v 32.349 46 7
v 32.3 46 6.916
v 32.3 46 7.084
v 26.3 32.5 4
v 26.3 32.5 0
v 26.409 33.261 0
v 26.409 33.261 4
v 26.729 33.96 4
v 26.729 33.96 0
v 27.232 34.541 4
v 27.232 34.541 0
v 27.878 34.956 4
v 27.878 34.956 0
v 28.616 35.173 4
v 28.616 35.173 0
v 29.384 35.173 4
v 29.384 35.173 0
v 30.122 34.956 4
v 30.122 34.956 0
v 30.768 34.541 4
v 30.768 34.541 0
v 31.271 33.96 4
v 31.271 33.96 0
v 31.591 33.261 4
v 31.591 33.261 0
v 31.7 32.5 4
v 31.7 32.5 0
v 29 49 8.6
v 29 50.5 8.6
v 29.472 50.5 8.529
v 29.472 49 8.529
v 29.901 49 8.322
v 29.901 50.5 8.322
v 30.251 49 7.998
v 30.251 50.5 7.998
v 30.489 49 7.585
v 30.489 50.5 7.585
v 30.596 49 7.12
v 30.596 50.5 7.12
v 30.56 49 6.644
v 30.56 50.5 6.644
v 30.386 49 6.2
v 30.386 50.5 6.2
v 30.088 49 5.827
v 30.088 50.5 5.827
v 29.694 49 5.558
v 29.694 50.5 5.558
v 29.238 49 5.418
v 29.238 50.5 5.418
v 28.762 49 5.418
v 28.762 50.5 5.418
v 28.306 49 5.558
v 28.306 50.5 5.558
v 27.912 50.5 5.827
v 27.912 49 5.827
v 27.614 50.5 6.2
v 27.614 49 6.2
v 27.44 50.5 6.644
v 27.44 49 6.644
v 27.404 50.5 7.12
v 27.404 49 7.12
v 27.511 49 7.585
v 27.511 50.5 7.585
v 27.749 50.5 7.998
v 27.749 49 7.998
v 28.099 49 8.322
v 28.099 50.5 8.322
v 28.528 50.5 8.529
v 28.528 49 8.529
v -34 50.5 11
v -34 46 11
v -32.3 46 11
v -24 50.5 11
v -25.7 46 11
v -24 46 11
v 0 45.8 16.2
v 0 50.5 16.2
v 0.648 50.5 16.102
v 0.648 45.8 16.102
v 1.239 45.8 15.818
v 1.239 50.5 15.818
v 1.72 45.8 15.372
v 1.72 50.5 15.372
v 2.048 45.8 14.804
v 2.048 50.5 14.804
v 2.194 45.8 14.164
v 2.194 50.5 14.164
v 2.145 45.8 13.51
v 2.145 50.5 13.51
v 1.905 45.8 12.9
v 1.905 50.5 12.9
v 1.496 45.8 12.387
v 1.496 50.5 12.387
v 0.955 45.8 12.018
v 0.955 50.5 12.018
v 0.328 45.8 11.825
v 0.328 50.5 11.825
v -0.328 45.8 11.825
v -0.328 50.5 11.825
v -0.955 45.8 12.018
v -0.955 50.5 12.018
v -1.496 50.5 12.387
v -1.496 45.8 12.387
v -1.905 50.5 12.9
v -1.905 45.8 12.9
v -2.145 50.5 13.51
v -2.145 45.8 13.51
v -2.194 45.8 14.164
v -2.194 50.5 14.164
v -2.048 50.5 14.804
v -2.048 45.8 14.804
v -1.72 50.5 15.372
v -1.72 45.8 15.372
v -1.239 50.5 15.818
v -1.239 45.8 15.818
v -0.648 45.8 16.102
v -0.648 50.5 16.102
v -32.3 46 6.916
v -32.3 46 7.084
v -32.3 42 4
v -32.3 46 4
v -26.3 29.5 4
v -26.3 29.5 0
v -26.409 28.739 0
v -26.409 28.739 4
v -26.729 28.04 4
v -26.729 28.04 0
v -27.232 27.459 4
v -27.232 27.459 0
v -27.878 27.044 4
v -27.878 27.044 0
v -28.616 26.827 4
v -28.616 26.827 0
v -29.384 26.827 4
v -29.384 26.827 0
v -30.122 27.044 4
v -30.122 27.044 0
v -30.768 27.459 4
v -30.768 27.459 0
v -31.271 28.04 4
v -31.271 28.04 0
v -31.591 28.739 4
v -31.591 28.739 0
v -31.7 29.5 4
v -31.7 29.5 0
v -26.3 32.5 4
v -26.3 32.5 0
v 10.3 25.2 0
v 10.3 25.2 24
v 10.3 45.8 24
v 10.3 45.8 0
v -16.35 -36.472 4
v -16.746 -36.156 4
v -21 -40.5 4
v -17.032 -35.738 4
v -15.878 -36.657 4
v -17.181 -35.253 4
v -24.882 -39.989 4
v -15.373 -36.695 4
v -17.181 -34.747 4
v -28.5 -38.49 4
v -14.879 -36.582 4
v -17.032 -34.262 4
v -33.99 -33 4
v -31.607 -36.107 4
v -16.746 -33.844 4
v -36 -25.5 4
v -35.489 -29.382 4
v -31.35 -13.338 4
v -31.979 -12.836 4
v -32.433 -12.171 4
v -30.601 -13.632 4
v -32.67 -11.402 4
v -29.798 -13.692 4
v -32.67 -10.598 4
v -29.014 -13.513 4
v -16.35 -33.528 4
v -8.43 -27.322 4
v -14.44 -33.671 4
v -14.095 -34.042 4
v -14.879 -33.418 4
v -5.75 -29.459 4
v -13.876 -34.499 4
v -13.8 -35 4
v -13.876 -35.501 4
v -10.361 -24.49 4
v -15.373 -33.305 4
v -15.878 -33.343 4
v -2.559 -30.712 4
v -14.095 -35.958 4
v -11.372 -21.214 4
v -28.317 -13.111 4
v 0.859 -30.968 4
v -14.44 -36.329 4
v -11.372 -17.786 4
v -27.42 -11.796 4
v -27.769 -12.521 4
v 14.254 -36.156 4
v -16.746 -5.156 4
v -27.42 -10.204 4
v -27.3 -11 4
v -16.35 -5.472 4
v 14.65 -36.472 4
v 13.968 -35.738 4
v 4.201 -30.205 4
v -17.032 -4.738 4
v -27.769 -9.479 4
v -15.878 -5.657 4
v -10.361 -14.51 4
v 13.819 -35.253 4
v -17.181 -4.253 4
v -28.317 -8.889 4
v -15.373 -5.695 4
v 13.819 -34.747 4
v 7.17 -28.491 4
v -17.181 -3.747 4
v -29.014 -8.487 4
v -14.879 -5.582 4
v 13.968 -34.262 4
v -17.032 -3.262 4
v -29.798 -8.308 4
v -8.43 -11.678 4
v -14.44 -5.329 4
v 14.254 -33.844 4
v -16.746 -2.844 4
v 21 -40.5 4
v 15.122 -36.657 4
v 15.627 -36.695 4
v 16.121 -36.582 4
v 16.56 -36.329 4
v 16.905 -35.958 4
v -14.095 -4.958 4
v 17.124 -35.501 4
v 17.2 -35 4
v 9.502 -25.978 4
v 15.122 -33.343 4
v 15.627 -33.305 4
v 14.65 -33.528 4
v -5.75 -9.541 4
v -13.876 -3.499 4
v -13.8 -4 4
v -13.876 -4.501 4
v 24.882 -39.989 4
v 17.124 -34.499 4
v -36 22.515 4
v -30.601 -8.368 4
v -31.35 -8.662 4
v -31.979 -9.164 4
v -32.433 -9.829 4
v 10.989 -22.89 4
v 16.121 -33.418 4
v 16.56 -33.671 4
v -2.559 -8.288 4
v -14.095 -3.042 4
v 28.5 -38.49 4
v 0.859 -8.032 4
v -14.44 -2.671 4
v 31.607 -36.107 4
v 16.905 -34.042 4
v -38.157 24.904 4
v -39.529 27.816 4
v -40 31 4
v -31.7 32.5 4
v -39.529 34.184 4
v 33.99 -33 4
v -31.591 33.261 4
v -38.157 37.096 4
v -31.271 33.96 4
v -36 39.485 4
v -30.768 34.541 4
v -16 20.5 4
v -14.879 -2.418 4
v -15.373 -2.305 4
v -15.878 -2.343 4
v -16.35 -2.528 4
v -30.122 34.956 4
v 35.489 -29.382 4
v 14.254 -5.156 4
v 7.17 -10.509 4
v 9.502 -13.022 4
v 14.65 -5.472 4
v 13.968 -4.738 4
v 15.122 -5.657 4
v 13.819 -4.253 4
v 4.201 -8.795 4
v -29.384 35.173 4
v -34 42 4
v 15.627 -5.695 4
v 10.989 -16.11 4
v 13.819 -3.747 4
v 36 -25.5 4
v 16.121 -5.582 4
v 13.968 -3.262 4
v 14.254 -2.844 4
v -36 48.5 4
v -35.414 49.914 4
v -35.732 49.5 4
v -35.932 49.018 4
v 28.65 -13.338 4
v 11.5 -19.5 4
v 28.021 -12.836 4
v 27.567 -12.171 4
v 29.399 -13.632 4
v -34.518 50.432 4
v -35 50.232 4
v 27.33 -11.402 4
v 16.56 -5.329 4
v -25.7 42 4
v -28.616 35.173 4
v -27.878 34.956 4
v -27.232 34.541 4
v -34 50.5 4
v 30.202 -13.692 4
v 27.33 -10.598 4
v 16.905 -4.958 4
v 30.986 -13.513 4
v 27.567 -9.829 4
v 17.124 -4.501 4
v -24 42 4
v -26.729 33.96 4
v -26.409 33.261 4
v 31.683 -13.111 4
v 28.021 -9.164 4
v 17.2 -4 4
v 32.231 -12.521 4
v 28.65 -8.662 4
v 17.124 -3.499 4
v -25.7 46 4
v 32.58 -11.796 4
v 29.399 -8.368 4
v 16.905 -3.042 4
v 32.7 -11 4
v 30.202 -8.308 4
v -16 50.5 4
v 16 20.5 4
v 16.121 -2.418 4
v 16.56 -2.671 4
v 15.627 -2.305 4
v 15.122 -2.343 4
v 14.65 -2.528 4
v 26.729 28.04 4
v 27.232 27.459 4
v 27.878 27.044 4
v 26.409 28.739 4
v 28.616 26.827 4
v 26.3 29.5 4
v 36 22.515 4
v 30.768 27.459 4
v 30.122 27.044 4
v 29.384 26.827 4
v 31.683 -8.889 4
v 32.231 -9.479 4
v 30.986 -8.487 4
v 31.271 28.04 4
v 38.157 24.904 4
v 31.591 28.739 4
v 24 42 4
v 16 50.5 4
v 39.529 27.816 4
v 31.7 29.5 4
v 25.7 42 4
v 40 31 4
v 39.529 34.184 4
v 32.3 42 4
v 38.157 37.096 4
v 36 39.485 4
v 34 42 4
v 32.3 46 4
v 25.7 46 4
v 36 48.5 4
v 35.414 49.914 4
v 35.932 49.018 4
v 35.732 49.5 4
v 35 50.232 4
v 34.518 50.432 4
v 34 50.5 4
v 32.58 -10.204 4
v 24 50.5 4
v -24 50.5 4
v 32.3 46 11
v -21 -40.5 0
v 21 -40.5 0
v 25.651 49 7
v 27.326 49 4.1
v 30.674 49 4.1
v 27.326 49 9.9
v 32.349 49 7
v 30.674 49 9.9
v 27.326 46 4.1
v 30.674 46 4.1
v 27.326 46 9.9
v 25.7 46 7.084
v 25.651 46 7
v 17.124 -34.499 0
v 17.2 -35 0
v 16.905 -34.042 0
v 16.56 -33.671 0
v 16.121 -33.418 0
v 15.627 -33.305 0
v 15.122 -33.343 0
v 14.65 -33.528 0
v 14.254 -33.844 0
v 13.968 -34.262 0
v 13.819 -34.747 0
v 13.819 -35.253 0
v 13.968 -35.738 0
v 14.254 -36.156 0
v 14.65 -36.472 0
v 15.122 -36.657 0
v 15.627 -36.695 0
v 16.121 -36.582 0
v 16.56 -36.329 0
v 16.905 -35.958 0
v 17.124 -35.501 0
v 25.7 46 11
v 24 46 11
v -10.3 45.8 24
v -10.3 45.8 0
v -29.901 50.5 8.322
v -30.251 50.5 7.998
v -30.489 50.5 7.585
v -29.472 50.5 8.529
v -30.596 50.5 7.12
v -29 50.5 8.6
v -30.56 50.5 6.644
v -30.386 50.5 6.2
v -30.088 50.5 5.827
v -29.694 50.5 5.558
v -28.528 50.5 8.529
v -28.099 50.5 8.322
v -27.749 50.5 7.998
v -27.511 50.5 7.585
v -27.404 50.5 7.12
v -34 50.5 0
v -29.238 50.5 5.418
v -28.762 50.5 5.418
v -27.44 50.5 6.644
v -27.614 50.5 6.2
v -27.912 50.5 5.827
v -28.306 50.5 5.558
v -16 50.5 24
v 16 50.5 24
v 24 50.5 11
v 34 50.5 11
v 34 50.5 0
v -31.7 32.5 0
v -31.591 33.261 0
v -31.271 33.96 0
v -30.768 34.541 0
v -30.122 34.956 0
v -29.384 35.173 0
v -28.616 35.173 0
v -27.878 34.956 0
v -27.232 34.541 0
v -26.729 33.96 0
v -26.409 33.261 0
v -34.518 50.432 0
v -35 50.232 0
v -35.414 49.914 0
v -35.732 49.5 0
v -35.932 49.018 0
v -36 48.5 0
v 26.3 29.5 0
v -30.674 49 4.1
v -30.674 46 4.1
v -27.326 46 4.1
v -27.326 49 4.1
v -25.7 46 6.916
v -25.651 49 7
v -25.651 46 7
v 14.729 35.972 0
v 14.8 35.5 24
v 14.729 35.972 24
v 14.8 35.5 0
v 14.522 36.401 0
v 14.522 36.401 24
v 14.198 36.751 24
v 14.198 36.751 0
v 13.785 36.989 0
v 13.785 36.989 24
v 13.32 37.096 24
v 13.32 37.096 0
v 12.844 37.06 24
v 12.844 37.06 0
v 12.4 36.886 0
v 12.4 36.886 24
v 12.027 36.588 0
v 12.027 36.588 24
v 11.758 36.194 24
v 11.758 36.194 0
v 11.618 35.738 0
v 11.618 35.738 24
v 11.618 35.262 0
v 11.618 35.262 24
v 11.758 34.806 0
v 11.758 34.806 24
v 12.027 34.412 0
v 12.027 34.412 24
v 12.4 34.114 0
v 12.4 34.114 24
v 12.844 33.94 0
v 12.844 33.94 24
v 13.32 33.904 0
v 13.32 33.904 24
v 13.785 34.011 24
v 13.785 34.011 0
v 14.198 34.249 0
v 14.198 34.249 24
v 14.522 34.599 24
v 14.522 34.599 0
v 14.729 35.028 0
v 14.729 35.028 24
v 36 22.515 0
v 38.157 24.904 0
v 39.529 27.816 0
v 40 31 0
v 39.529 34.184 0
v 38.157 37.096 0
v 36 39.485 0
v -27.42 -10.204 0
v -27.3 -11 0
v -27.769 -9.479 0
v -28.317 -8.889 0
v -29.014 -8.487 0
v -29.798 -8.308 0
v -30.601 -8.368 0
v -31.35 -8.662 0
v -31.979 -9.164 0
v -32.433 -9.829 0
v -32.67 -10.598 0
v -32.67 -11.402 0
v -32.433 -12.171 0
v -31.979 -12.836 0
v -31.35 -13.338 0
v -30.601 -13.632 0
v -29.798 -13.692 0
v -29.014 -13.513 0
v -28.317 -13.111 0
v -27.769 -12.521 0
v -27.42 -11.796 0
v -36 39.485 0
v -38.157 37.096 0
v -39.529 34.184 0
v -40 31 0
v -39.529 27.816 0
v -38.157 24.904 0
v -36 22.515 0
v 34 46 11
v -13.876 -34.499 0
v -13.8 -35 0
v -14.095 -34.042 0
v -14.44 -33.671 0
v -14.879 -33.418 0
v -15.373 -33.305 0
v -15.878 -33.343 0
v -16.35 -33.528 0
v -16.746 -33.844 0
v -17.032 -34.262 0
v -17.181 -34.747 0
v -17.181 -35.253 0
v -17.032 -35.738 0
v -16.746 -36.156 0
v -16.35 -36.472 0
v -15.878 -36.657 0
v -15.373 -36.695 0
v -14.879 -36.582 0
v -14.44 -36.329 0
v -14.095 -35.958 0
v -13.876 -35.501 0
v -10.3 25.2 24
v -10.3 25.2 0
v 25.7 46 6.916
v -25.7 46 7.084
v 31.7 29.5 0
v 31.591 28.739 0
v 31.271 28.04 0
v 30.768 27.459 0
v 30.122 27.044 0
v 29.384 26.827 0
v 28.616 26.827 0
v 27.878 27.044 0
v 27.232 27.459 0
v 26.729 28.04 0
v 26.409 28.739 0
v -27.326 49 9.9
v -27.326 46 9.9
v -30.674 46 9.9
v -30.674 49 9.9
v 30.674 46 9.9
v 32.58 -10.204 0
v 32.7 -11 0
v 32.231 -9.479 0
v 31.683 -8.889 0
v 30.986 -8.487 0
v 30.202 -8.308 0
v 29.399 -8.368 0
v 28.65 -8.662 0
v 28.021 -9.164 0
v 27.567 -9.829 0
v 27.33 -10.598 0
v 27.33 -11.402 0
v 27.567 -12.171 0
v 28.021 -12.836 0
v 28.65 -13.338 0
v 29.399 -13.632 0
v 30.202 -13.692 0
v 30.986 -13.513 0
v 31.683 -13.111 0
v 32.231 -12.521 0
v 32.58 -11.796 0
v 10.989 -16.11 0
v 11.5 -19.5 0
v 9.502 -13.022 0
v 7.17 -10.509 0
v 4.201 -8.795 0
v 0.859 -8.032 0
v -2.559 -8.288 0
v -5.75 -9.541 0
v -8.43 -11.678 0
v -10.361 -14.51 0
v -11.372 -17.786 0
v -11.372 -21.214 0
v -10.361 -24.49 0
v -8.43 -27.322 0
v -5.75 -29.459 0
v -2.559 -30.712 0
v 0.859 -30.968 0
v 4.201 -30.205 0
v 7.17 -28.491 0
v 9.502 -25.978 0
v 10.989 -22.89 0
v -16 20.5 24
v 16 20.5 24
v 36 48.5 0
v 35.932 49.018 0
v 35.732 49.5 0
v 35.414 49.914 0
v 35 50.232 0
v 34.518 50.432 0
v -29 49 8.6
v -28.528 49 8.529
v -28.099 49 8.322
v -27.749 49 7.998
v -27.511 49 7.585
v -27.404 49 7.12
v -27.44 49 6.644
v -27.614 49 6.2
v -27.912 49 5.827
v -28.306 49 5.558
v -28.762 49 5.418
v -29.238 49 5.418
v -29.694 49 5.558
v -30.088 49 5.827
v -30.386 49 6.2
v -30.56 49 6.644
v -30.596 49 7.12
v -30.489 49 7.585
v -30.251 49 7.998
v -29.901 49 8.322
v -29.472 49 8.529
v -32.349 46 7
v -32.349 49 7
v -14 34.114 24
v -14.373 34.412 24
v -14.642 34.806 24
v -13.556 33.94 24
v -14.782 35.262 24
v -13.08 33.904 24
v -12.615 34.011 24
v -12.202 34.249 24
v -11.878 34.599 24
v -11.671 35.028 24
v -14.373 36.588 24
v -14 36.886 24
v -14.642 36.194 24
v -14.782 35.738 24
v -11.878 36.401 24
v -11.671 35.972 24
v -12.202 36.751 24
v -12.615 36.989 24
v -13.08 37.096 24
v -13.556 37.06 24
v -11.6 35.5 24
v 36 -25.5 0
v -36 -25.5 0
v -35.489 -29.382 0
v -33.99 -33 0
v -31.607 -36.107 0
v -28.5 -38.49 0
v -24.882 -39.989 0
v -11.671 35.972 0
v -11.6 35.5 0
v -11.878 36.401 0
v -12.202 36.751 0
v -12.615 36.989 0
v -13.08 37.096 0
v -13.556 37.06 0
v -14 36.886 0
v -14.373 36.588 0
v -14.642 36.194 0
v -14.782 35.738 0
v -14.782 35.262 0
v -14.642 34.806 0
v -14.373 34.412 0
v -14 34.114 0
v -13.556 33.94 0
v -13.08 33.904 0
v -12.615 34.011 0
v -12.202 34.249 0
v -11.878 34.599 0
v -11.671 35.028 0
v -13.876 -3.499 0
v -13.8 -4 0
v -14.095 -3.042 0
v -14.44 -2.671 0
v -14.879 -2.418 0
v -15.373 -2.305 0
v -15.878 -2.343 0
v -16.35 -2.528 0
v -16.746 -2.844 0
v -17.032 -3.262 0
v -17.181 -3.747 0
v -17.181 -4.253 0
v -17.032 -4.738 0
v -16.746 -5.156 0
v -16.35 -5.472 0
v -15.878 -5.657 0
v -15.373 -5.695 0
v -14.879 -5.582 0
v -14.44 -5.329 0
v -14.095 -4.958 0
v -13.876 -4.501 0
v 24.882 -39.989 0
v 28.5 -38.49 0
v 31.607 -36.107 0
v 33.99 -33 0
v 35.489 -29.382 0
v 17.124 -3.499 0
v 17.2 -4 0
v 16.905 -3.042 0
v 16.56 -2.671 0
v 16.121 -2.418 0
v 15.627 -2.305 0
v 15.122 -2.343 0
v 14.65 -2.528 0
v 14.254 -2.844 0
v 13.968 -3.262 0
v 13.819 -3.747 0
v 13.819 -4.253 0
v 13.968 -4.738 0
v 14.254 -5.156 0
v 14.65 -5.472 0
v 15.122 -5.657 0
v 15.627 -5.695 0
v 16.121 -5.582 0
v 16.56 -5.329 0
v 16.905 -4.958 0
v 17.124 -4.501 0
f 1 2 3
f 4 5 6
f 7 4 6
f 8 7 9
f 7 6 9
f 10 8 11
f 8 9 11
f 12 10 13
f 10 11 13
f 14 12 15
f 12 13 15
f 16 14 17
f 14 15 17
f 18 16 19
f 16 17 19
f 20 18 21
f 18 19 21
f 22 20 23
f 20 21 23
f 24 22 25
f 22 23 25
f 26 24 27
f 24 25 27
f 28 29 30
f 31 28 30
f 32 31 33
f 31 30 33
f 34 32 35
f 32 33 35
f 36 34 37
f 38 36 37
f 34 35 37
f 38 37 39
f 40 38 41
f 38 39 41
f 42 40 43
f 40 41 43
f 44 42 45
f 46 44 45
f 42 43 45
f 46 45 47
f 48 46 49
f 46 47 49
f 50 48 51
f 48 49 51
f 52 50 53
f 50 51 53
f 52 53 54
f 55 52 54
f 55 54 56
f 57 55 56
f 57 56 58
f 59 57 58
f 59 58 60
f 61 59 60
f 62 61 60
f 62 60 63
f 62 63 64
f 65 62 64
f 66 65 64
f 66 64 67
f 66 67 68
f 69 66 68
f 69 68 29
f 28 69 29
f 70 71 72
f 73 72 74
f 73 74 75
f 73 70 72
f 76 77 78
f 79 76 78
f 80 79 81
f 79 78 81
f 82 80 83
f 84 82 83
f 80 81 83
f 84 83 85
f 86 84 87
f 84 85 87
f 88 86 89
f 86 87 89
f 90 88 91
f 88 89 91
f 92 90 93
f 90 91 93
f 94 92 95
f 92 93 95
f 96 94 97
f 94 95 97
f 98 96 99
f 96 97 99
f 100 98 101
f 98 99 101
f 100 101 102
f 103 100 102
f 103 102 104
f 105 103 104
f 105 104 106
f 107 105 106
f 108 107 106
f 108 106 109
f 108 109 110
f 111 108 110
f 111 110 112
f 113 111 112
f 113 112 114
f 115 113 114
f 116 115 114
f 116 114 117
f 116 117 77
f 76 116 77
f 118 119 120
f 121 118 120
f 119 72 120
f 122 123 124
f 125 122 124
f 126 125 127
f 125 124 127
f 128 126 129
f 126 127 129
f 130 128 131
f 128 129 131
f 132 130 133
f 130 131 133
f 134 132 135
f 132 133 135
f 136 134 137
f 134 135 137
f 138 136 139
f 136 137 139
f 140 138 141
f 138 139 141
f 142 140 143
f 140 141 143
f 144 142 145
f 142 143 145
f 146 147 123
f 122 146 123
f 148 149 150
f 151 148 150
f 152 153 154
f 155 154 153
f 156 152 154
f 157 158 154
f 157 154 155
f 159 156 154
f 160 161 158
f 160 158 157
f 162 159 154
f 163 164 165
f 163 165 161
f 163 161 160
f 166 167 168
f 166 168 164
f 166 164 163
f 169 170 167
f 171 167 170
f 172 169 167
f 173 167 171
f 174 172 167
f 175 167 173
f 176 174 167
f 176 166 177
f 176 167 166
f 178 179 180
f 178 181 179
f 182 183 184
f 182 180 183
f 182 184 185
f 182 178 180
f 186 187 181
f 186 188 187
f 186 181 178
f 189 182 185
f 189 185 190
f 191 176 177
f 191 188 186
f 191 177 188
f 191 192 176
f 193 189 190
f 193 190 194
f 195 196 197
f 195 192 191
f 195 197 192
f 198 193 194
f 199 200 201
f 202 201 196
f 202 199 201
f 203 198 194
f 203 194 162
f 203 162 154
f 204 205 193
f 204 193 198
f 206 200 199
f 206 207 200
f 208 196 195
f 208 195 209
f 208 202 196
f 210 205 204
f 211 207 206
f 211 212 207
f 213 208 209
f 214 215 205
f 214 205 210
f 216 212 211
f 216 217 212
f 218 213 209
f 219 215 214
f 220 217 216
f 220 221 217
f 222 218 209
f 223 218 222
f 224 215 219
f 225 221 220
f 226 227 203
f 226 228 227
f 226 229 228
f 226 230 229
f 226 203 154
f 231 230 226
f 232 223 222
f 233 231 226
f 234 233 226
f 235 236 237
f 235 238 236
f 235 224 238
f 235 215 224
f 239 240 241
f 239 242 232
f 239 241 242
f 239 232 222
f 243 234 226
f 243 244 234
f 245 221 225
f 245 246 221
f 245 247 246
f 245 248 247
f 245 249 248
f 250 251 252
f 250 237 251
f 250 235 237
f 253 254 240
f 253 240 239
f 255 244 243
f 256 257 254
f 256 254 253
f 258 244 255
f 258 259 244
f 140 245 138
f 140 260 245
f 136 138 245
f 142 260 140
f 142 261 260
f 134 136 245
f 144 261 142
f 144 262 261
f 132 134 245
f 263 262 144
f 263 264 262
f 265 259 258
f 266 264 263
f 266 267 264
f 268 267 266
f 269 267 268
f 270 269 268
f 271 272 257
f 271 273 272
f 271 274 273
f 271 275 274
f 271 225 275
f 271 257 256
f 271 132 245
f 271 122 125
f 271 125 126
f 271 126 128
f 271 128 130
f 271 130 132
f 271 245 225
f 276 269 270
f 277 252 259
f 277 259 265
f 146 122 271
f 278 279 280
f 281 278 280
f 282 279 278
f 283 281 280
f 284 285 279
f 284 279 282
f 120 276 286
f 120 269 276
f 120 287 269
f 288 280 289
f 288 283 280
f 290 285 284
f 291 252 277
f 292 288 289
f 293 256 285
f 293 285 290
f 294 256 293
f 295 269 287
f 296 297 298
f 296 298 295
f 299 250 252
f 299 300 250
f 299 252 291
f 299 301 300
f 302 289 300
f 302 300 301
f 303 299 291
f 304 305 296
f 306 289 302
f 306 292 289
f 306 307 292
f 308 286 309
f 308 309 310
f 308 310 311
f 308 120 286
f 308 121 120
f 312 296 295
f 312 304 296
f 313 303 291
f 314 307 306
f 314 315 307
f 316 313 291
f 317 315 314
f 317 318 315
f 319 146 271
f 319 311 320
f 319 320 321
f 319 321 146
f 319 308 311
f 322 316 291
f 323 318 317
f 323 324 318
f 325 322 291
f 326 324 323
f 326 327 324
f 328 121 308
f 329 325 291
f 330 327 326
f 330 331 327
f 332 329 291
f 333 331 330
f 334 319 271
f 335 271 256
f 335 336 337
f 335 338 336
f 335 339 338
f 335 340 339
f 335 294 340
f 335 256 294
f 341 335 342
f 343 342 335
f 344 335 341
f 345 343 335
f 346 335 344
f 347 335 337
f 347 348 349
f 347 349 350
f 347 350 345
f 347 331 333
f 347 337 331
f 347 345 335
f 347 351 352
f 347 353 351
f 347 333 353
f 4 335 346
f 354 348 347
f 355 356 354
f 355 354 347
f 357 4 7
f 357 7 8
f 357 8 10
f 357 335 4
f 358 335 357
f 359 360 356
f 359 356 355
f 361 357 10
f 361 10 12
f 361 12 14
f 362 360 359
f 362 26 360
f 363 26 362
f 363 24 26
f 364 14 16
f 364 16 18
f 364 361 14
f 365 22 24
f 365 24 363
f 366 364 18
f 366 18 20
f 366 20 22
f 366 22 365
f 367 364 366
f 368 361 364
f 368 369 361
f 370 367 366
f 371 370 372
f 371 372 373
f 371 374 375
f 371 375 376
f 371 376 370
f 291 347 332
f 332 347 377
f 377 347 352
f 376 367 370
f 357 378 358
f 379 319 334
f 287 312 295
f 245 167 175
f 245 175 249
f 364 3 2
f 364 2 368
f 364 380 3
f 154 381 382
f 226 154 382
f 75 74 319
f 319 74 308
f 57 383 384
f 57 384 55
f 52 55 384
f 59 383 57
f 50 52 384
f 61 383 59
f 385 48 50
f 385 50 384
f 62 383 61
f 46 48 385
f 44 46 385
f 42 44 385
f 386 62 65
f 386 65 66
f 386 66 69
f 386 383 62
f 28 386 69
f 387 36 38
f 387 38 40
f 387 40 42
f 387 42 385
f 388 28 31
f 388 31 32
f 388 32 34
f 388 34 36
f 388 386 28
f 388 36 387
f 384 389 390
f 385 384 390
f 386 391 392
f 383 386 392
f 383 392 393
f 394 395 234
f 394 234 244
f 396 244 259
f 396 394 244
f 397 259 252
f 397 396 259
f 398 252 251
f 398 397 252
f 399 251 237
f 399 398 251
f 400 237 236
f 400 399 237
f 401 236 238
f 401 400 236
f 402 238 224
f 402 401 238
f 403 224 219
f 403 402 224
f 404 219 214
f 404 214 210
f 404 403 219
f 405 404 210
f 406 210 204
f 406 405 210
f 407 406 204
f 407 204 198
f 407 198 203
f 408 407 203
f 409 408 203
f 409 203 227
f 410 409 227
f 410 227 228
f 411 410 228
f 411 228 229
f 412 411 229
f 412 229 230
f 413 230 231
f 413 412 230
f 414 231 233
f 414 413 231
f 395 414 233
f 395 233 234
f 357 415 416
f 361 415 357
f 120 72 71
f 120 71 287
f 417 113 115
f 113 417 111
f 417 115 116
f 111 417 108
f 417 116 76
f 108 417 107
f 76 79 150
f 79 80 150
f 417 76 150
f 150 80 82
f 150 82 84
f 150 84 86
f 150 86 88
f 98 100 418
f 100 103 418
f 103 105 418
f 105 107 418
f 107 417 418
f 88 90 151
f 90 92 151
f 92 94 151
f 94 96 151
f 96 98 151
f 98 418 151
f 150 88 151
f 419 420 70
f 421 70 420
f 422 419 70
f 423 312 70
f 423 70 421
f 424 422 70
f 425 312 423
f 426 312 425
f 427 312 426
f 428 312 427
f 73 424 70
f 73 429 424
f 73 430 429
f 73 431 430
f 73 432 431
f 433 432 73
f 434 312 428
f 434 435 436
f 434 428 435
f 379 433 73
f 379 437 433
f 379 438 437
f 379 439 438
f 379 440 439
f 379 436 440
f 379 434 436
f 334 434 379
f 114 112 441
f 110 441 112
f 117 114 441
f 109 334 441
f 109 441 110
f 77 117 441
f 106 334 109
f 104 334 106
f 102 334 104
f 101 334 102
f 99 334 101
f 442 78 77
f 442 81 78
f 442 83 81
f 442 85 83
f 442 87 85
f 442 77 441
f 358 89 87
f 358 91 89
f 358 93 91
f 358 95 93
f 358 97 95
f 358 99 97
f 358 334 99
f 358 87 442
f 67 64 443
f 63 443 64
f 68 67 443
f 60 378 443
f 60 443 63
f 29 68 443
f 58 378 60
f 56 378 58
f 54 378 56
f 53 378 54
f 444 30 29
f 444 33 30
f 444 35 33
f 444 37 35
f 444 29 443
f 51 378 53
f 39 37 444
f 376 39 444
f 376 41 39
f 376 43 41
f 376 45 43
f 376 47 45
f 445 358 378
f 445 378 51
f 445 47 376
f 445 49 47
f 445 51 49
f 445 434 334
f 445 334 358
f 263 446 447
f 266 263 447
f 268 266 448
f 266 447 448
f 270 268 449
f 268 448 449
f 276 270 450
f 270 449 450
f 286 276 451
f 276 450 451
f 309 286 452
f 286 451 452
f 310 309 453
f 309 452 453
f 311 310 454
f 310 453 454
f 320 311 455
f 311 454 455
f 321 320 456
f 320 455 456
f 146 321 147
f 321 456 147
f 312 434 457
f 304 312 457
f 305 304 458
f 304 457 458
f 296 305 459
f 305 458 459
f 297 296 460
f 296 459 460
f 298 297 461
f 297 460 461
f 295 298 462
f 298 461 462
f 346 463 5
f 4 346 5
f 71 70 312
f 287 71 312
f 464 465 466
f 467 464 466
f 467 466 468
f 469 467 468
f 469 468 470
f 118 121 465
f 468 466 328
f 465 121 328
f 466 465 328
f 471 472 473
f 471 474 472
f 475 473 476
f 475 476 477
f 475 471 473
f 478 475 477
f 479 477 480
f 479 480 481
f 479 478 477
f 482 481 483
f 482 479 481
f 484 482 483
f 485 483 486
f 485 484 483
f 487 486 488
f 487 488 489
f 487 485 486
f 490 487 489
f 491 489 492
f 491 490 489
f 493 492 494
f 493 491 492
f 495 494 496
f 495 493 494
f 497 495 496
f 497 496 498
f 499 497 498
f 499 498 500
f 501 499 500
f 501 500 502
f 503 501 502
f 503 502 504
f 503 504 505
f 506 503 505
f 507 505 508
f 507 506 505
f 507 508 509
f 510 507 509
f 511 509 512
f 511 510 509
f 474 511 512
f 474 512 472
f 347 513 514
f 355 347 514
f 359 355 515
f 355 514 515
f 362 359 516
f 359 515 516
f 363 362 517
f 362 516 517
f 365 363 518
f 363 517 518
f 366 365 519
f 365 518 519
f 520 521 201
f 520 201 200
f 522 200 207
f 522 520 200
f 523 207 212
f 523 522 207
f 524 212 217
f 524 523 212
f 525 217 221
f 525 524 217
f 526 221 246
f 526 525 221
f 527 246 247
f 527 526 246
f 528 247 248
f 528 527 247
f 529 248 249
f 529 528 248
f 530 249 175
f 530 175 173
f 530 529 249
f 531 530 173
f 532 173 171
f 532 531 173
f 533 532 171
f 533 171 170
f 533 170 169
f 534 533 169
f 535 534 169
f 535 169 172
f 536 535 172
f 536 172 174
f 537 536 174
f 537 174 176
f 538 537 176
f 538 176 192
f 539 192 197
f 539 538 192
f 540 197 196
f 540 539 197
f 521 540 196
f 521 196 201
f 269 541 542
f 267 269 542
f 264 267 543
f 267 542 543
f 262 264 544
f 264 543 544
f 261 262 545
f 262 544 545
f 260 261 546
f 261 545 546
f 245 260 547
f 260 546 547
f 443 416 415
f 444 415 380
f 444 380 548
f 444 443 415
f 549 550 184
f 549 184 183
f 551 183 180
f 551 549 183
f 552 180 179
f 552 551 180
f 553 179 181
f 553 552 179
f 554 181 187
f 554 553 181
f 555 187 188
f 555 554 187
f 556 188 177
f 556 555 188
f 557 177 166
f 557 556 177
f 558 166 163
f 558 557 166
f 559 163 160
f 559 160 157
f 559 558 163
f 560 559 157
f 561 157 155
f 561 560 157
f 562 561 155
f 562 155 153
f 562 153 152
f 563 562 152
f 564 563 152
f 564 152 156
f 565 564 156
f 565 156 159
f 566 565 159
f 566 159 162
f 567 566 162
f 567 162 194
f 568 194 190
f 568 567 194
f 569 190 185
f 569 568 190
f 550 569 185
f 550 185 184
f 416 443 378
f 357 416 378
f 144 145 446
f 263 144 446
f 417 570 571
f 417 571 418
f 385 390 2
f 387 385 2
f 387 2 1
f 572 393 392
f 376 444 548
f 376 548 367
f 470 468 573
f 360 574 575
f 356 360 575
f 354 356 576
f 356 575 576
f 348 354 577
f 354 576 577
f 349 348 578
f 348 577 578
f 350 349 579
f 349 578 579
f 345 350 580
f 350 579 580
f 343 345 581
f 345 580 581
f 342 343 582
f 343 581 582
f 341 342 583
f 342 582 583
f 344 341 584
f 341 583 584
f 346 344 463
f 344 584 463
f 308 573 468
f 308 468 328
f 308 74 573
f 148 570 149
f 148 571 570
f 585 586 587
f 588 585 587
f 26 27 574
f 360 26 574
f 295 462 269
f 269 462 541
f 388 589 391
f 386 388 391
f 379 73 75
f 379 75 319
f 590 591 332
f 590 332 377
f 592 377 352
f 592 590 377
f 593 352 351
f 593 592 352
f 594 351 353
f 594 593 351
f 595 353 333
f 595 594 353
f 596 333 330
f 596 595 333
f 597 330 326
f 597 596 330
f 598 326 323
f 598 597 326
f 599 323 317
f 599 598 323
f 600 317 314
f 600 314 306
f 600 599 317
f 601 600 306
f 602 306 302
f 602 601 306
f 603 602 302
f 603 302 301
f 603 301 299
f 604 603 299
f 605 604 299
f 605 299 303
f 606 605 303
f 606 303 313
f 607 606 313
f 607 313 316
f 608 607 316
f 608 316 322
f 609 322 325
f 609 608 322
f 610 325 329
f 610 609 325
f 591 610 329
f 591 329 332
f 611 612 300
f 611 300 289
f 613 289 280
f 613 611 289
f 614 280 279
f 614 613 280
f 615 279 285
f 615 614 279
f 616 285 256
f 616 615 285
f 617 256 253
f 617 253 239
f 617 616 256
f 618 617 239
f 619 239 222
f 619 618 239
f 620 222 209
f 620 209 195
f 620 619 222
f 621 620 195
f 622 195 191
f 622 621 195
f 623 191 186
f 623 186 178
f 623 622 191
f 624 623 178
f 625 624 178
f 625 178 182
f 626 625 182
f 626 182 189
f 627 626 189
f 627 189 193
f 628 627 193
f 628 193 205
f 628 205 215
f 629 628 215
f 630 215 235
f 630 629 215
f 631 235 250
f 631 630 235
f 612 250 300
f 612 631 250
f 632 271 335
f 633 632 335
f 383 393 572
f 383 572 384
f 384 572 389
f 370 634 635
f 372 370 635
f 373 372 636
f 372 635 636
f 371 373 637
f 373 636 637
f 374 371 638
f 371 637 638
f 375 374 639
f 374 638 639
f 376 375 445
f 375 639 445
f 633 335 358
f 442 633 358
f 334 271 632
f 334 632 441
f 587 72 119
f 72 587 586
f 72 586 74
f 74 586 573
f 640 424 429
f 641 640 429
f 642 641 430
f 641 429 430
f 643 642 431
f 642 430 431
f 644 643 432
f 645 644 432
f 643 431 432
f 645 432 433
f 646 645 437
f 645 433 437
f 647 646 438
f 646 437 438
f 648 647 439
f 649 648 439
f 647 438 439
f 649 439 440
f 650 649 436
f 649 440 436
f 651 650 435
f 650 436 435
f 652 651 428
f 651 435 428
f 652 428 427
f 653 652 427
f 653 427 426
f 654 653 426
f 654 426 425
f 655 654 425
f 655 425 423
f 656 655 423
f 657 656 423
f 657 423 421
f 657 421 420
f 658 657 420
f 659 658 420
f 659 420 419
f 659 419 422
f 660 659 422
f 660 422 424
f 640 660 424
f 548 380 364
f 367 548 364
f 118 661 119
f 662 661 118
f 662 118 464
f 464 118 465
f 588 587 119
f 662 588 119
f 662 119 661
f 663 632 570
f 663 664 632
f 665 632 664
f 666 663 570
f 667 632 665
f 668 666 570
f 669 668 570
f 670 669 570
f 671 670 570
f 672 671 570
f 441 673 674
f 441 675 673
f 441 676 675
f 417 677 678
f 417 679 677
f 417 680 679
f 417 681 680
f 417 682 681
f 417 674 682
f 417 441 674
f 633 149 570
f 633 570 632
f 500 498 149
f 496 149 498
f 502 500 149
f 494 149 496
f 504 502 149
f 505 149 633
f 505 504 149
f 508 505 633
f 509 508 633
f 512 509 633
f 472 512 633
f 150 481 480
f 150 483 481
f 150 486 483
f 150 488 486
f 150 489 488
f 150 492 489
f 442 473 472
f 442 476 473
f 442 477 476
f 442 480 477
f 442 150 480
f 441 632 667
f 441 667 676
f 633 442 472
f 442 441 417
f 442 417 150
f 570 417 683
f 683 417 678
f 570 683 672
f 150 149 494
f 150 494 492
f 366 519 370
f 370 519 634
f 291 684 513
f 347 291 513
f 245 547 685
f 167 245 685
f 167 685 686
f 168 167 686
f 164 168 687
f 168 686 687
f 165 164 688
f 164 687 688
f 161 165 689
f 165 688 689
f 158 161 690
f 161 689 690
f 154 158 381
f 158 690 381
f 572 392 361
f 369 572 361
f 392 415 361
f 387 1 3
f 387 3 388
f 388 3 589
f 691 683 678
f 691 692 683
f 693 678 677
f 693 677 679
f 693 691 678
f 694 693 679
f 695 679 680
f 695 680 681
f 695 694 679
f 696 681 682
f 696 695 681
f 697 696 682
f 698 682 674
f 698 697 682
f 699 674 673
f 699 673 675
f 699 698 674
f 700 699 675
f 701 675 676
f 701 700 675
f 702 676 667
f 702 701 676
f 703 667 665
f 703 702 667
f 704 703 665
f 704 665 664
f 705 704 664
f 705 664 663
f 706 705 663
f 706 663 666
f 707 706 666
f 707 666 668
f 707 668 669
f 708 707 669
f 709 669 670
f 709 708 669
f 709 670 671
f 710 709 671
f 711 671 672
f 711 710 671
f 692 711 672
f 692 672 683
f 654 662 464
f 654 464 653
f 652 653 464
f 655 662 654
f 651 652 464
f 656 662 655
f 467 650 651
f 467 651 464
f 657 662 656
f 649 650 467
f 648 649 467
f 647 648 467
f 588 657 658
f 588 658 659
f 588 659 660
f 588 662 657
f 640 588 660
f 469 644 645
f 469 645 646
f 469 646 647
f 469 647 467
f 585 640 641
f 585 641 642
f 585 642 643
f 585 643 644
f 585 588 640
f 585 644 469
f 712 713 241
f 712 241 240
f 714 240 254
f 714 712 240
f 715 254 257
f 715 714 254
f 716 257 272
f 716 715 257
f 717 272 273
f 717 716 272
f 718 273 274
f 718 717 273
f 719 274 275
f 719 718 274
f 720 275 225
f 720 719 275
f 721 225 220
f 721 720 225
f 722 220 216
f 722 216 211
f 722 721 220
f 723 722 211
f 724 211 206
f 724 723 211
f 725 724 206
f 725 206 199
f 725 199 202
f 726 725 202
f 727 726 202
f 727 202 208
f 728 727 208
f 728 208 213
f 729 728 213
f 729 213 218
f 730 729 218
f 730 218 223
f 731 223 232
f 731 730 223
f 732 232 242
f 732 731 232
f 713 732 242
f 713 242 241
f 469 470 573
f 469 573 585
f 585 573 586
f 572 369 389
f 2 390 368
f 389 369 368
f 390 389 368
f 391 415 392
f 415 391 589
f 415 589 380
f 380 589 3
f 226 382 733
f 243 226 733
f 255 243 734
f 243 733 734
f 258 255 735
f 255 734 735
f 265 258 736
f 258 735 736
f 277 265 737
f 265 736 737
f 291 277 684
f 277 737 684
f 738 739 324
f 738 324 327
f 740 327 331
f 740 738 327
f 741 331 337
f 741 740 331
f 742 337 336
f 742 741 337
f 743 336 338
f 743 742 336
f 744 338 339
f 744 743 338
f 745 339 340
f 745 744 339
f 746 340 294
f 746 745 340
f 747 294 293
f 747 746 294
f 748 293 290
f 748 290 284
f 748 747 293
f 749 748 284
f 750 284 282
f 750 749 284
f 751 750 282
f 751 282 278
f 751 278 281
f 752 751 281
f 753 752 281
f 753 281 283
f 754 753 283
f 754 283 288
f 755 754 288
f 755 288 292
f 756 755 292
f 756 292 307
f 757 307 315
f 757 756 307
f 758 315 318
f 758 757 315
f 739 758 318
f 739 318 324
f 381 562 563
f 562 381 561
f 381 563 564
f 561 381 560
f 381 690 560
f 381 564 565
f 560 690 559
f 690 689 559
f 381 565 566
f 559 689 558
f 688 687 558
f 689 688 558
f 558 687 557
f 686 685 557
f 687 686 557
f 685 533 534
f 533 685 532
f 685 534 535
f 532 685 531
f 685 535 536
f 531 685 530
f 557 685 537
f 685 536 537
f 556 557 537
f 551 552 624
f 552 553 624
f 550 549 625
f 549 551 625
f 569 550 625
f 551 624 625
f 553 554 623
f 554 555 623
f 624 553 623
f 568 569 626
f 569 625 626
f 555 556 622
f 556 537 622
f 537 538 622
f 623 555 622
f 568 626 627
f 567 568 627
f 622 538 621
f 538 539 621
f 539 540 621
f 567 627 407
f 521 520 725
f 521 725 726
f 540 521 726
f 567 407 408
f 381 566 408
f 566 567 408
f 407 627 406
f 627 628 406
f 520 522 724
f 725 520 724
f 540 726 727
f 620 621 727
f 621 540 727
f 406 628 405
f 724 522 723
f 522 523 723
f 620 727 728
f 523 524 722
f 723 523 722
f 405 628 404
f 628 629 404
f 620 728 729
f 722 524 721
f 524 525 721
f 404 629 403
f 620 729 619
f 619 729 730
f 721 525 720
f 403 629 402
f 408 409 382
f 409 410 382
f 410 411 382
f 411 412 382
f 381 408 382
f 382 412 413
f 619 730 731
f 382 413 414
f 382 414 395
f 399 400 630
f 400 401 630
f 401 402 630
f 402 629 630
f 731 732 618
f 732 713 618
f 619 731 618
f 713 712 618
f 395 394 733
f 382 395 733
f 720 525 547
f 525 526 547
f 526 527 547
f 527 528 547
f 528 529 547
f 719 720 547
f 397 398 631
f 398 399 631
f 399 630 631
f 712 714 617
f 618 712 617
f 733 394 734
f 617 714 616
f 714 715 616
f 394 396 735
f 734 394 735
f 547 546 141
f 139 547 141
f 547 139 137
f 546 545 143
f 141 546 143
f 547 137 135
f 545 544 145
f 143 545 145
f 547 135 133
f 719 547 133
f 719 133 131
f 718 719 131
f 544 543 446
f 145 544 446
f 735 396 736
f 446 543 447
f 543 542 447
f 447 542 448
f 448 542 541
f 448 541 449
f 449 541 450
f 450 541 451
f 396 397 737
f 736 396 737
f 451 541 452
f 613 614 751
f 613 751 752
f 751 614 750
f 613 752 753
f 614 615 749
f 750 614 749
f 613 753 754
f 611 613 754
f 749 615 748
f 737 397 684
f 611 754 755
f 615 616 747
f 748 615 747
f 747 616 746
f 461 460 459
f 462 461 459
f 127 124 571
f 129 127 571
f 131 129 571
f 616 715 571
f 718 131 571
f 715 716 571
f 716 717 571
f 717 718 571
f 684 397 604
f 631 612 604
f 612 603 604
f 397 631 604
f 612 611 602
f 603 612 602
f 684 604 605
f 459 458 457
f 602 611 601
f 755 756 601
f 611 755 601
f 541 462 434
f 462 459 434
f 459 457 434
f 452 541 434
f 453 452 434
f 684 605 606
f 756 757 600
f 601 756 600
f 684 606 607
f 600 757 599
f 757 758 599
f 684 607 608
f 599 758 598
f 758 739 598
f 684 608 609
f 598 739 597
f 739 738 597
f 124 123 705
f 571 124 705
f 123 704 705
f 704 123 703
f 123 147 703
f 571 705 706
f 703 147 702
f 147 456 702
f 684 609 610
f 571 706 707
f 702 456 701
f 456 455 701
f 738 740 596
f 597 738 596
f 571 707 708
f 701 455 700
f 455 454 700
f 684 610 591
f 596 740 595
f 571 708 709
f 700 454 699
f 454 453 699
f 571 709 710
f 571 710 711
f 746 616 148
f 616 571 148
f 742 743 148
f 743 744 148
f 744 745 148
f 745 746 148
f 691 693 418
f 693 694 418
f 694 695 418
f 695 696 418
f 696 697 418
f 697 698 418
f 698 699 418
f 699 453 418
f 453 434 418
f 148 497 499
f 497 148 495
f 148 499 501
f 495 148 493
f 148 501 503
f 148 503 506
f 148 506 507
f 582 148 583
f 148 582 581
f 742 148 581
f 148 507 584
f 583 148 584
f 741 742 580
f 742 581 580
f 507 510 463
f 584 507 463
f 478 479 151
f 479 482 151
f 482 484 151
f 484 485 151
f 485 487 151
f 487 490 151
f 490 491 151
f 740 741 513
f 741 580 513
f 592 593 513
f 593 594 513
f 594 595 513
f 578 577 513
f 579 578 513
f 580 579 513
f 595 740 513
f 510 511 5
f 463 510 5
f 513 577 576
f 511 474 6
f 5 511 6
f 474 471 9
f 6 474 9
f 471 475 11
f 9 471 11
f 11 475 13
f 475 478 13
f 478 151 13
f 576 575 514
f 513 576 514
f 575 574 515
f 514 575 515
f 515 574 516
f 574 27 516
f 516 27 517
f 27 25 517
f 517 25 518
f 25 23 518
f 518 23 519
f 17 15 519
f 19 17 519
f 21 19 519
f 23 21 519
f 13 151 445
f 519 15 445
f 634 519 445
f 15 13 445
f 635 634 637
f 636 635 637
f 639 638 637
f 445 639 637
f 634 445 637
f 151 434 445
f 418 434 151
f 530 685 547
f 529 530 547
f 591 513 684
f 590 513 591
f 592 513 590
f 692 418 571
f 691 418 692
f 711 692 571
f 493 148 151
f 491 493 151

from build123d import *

# Parameters (mm, degrees)
SKETCH_1_R          = 1.7
SKETCH_1_R_2        = 11.5
SKETCH_1_R_3        = 2.7
SKETCH_1_R_4        = 1.6
SKETCH_1_W          = 20.6
SKETCH_1_H          = 20.6
EXTRUDE_1_DEPTH     = 4
EXTRUDE_START       = 4
SKETCH_1_3_W        = 10
SKETCH_1_3_H        = 4.5
EXTRUDE_2_DEPTH     = 7
SKETCH_1_4_W        = 32
SKETCH_1_4_H        = 30
SKETCH_1_4_R        = 1.6
SKETCH_1_4_W_2      = 20.6
SKETCH_1_4_H_2      = 20.6
EXTRUDE_3_DEPTH     = 20
RIB_1_REACH         = 94.748
SKETCH_3_WALL_W     = 195.558888446
SKETCH_3_WALL_H     = 1.7
RIB_2_REACH         = 86.984
SKETCH_4_WALL_W     = 180.029901728
SKETCH_4_WALL_H     = 1.7
CUT_EXTRUDE_1_REACH = 104.259
SKETCH_5_R          = 2.2
SKETCH_5_R_2        = 1.6
CUT_EXTRUDE_2_DEPTH = 3


with BuildPart() as part:
    # 草图1 → 凸台-拉伸1 (new body)
    with BuildSketch(Plane.XY):
        with BuildLine():
            ThreePointArc((36, 48.5), (35.414213562, 49.914213562), (34, 50.5))
            Line((34, 50.5), (-34, 50.5))
            ThreePointArc((-34, 50.5), (-35.414213562, 49.914213562), (-36, 48.5))
            Line((-36, 48.5), (-36, 39.485281374))
            ThreePointArc((-36, 39.485281374), (-40, 31), (-36, 22.514718626))
            Line((-36, 22.514718626), (-36, -25.5))
            ThreePointArc((-36, -25.5), (-31.606601718, -36.106601718), (-21, -40.5))
            Line((-21, -40.5), (21, -40.5))
            ThreePointArc((21, -40.5), (31.606601718, -36.106601718), (36, -25.5))
            Line((36, -25.5), (36, 22.514718626))
            ThreePointArc((36, 22.514718626), (40, 31), (36, 39.485281374))
            Line((36, 39.485281374), (36, 48.5))
        make_face()
        with Locations((-15.5, -35)):
            Circle(SKETCH_1_R, mode=Mode.SUBTRACT)
        with Locations((15.5, -35)):
            Circle(SKETCH_1_R, mode=Mode.SUBTRACT)
        with Locations((0, -19.5)):
            Circle(SKETCH_1_R_2, mode=Mode.SUBTRACT)
        with Locations((-30, -11)):
            Circle(SKETCH_1_R_3, mode=Mode.SUBTRACT)
        with Locations((-15.5, -4)):
            Circle(SKETCH_1_R, mode=Mode.SUBTRACT)
        with Locations((30, -11)):
            Circle(SKETCH_1_R_3, mode=Mode.SUBTRACT)
        with Locations((15.5, -4)):
            Circle(SKETCH_1_R, mode=Mode.SUBTRACT)
        with BuildLine():
            Line((-26.3, 32.5), (-26.3, 29.5))
            ThreePointArc((-26.3, 29.5), (-29, 26.8), (-31.7, 29.5))
            Line((-31.7, 29.5), (-31.7, 32.5))
            ThreePointArc((-31.7, 32.5), (-29, 35.2), (-26.3, 32.5))
        make_face(mode=Mode.SUBTRACT)
        with BuildLine():
            Line((31.7, 32.5), (31.7, 29.5))
            ThreePointArc((31.7, 29.5), (29, 26.8), (26.3, 29.5))
            Line((26.3, 29.5), (26.3, 32.5))
            ThreePointArc((26.3, 32.5), (29, 35.2), (31.7, 32.5))
        make_face(mode=Mode.SUBTRACT)
        with Locations((13.2, 35.5)):
            Circle(SKETCH_1_R_4, mode=Mode.SUBTRACT)
        with Locations((0, 35.5)):
            Rectangle(SKETCH_1_W, SKETCH_1_H, mode=Mode.SUBTRACT)
        with Locations((-13.2, 35.5)):
            Circle(SKETCH_1_R_4, mode=Mode.SUBTRACT)
    extrude(amount=EXTRUDE_1_DEPTH)

    # 草图1<3> → 凸台-拉伸2 (add)
    with BuildSketch(Plane.XY.offset(EXTRUDE_START)):
        with Locations((-29, 48.25)):
            Rectangle(SKETCH_1_3_W, SKETCH_1_3_H)
        with Locations((29, 48.25)):
            Rectangle(SKETCH_1_3_W, SKETCH_1_3_H)
    extrude(amount=EXTRUDE_2_DEPTH)

    # 草图1<4> → 凸台-拉伸3 (add)
    with BuildSketch(Plane.XY.offset(EXTRUDE_START)):
        with Locations((0, 35.5)):
            Rectangle(SKETCH_1_4_W, SKETCH_1_4_H)
        with Locations((-13.2, 35.5)):
            Circle(SKETCH_1_4_R, mode=Mode.SUBTRACT)
        with Locations((0, 35.5)):
            Rectangle(SKETCH_1_4_W_2, SKETCH_1_4_H_2, mode=Mode.SUBTRACT)
        with Locations((13.2, 35.5)):
            Circle(SKETCH_1_4_R, mode=Mode.SUBTRACT)
    extrude(amount=EXTRUDE_3_DEPTH)

    # 草图3 wall → 筋1 (add, up to next)
    with BuildSketch(Plane(origin=(-34, 44, 7.5), x_dir=(0, -0.496138938357, -0.868243142124), z_dir=(0, -0.868243142124, 0.496138938357)), mode=Mode.PRIVATE) as rib_1_sk1:
        with Locations((0, 0.85)):
            Rectangle(SKETCH_3_WALL_W, SKETCH_3_WALL_H)
    rib_1_tool1 = extrude(rib_1_sk1.sketch, amount=-RIB_1_REACH, mode=Mode.PRIVATE) - part.part
    rib_1 = rib_1_tool1.solids().sort_by_distance((-34, 44, 7.5))[0]
    add(rib_1)

    # 草图4 wall → 筋2 (add, up to next)
    with BuildSketch(Plane(origin=(-24, 44, 7.5), x_dir=(0, -0.496138938357, -0.868243142124), z_dir=(0, 0.868243142124, -0.496138938357)), mode=Mode.PRIVATE) as rib_2_sk1:
        with Locations((0, 0.85)):
            Rectangle(SKETCH_4_WALL_W, SKETCH_4_WALL_H)
    rib_2_tool1 = extrude(rib_2_sk1.sketch, amount=RIB_2_REACH, mode=Mode.PRIVATE) - part.part
    rib_2 = rib_2_tool1.solids().sort_by_distance((-24, 44, 7.5))[0]
    add(rib_2)

    # 镜向1: 筋1, 筋2 across plane
    add(rib_1.mirror(Plane(origin=(0, 0, 0), x_dir=(0, 0, 1), z_dir=(1, 0, 0))))
    add(rib_2.mirror(Plane(origin=(0, 0, 0), x_dir=(0, 0, 1), z_dir=(1, 0, 0))))

    # 草图5 → 切除-拉伸1 (cut, up to next)
    with BuildSketch(Plane(origin=(0, 50.5, 0), x_dir=(1, 0, 0), z_dir=(0, 1, 0)), mode=Mode.PRIVATE) as cut_extrude_1_sk1:
        with Locations(Location((0, -14, 0), (0, 0, 270))):
            Circle(SKETCH_5_R)
    cut_extrude_1_tool1 = extrude(cut_extrude_1_sk1.sketch, amount=-CUT_EXTRUDE_1_REACH, mode=Mode.PRIVATE) & part.part
    # 草图5 → 切除-拉伸1 (cut, up to next)
    with BuildSketch(Plane(origin=(0, 50.5, 0), x_dir=(1, 0, 0), z_dir=(0, 1, 0)), mode=Mode.PRIVATE) as cut_extrude_1_sk2:
        with Locations(Location((29, -7, 0), (0, 0, 270))):
            Circle(SKETCH_5_R_2)
    cut_extrude_1_tool2 = extrude(cut_extrude_1_sk2.sketch, amount=-CUT_EXTRUDE_1_REACH, mode=Mode.PRIVATE) & part.part
    # 草图5 → 切除-拉伸1 (cut, up to next)
    with BuildSketch(Plane(origin=(0, 50.5, 0), x_dir=(1, 0, 0), z_dir=(0, 1, 0)), mode=Mode.PRIVATE) as cut_extrude_1_sk3:
        with Locations(Location((-29, -7, 0), (0, 0, 270))):
            Circle(SKETCH_5_R_2)
    cut_extrude_1_tool3 = extrude(cut_extrude_1_sk3.sketch, amount=-CUT_EXTRUDE_1_REACH, mode=Mode.PRIVATE) & part.part
    add(cut_extrude_1_tool1.solids().sort_by_distance((0, 50.5, 14))[0], mode=Mode.SUBTRACT)
    add(cut_extrude_1_tool2.solids().sort_by_distance((29, 50.5, 7))[0], mode=Mode.SUBTRACT)
    add(cut_extrude_1_tool3.solids().sort_by_distance((-29, 50.5, 7))[0], mode=Mode.SUBTRACT)

    # 草图6 → 切除-拉伸2 (cut)
    with BuildSketch(Plane.XZ.offset(-46)):
        Polygon((-27.325684219, 9.9), (-30.674315781, 9.9), (-32.348631561, 7), (-30.674315781, 4.1), (-27.325684219, 4.1), (-25.651368439, 7), align=None)
        Polygon((32.348631561, 7), (30.674315781, 9.9), (27.325684219, 9.9), (25.651368439, 7), (27.325684219, 4.1), (30.674315781, 4.1), align=None)
    extrude(amount=-CUT_EXTRUDE_2_DEPTH, mode=Mode.SUBTRACT)


solid = part.part
